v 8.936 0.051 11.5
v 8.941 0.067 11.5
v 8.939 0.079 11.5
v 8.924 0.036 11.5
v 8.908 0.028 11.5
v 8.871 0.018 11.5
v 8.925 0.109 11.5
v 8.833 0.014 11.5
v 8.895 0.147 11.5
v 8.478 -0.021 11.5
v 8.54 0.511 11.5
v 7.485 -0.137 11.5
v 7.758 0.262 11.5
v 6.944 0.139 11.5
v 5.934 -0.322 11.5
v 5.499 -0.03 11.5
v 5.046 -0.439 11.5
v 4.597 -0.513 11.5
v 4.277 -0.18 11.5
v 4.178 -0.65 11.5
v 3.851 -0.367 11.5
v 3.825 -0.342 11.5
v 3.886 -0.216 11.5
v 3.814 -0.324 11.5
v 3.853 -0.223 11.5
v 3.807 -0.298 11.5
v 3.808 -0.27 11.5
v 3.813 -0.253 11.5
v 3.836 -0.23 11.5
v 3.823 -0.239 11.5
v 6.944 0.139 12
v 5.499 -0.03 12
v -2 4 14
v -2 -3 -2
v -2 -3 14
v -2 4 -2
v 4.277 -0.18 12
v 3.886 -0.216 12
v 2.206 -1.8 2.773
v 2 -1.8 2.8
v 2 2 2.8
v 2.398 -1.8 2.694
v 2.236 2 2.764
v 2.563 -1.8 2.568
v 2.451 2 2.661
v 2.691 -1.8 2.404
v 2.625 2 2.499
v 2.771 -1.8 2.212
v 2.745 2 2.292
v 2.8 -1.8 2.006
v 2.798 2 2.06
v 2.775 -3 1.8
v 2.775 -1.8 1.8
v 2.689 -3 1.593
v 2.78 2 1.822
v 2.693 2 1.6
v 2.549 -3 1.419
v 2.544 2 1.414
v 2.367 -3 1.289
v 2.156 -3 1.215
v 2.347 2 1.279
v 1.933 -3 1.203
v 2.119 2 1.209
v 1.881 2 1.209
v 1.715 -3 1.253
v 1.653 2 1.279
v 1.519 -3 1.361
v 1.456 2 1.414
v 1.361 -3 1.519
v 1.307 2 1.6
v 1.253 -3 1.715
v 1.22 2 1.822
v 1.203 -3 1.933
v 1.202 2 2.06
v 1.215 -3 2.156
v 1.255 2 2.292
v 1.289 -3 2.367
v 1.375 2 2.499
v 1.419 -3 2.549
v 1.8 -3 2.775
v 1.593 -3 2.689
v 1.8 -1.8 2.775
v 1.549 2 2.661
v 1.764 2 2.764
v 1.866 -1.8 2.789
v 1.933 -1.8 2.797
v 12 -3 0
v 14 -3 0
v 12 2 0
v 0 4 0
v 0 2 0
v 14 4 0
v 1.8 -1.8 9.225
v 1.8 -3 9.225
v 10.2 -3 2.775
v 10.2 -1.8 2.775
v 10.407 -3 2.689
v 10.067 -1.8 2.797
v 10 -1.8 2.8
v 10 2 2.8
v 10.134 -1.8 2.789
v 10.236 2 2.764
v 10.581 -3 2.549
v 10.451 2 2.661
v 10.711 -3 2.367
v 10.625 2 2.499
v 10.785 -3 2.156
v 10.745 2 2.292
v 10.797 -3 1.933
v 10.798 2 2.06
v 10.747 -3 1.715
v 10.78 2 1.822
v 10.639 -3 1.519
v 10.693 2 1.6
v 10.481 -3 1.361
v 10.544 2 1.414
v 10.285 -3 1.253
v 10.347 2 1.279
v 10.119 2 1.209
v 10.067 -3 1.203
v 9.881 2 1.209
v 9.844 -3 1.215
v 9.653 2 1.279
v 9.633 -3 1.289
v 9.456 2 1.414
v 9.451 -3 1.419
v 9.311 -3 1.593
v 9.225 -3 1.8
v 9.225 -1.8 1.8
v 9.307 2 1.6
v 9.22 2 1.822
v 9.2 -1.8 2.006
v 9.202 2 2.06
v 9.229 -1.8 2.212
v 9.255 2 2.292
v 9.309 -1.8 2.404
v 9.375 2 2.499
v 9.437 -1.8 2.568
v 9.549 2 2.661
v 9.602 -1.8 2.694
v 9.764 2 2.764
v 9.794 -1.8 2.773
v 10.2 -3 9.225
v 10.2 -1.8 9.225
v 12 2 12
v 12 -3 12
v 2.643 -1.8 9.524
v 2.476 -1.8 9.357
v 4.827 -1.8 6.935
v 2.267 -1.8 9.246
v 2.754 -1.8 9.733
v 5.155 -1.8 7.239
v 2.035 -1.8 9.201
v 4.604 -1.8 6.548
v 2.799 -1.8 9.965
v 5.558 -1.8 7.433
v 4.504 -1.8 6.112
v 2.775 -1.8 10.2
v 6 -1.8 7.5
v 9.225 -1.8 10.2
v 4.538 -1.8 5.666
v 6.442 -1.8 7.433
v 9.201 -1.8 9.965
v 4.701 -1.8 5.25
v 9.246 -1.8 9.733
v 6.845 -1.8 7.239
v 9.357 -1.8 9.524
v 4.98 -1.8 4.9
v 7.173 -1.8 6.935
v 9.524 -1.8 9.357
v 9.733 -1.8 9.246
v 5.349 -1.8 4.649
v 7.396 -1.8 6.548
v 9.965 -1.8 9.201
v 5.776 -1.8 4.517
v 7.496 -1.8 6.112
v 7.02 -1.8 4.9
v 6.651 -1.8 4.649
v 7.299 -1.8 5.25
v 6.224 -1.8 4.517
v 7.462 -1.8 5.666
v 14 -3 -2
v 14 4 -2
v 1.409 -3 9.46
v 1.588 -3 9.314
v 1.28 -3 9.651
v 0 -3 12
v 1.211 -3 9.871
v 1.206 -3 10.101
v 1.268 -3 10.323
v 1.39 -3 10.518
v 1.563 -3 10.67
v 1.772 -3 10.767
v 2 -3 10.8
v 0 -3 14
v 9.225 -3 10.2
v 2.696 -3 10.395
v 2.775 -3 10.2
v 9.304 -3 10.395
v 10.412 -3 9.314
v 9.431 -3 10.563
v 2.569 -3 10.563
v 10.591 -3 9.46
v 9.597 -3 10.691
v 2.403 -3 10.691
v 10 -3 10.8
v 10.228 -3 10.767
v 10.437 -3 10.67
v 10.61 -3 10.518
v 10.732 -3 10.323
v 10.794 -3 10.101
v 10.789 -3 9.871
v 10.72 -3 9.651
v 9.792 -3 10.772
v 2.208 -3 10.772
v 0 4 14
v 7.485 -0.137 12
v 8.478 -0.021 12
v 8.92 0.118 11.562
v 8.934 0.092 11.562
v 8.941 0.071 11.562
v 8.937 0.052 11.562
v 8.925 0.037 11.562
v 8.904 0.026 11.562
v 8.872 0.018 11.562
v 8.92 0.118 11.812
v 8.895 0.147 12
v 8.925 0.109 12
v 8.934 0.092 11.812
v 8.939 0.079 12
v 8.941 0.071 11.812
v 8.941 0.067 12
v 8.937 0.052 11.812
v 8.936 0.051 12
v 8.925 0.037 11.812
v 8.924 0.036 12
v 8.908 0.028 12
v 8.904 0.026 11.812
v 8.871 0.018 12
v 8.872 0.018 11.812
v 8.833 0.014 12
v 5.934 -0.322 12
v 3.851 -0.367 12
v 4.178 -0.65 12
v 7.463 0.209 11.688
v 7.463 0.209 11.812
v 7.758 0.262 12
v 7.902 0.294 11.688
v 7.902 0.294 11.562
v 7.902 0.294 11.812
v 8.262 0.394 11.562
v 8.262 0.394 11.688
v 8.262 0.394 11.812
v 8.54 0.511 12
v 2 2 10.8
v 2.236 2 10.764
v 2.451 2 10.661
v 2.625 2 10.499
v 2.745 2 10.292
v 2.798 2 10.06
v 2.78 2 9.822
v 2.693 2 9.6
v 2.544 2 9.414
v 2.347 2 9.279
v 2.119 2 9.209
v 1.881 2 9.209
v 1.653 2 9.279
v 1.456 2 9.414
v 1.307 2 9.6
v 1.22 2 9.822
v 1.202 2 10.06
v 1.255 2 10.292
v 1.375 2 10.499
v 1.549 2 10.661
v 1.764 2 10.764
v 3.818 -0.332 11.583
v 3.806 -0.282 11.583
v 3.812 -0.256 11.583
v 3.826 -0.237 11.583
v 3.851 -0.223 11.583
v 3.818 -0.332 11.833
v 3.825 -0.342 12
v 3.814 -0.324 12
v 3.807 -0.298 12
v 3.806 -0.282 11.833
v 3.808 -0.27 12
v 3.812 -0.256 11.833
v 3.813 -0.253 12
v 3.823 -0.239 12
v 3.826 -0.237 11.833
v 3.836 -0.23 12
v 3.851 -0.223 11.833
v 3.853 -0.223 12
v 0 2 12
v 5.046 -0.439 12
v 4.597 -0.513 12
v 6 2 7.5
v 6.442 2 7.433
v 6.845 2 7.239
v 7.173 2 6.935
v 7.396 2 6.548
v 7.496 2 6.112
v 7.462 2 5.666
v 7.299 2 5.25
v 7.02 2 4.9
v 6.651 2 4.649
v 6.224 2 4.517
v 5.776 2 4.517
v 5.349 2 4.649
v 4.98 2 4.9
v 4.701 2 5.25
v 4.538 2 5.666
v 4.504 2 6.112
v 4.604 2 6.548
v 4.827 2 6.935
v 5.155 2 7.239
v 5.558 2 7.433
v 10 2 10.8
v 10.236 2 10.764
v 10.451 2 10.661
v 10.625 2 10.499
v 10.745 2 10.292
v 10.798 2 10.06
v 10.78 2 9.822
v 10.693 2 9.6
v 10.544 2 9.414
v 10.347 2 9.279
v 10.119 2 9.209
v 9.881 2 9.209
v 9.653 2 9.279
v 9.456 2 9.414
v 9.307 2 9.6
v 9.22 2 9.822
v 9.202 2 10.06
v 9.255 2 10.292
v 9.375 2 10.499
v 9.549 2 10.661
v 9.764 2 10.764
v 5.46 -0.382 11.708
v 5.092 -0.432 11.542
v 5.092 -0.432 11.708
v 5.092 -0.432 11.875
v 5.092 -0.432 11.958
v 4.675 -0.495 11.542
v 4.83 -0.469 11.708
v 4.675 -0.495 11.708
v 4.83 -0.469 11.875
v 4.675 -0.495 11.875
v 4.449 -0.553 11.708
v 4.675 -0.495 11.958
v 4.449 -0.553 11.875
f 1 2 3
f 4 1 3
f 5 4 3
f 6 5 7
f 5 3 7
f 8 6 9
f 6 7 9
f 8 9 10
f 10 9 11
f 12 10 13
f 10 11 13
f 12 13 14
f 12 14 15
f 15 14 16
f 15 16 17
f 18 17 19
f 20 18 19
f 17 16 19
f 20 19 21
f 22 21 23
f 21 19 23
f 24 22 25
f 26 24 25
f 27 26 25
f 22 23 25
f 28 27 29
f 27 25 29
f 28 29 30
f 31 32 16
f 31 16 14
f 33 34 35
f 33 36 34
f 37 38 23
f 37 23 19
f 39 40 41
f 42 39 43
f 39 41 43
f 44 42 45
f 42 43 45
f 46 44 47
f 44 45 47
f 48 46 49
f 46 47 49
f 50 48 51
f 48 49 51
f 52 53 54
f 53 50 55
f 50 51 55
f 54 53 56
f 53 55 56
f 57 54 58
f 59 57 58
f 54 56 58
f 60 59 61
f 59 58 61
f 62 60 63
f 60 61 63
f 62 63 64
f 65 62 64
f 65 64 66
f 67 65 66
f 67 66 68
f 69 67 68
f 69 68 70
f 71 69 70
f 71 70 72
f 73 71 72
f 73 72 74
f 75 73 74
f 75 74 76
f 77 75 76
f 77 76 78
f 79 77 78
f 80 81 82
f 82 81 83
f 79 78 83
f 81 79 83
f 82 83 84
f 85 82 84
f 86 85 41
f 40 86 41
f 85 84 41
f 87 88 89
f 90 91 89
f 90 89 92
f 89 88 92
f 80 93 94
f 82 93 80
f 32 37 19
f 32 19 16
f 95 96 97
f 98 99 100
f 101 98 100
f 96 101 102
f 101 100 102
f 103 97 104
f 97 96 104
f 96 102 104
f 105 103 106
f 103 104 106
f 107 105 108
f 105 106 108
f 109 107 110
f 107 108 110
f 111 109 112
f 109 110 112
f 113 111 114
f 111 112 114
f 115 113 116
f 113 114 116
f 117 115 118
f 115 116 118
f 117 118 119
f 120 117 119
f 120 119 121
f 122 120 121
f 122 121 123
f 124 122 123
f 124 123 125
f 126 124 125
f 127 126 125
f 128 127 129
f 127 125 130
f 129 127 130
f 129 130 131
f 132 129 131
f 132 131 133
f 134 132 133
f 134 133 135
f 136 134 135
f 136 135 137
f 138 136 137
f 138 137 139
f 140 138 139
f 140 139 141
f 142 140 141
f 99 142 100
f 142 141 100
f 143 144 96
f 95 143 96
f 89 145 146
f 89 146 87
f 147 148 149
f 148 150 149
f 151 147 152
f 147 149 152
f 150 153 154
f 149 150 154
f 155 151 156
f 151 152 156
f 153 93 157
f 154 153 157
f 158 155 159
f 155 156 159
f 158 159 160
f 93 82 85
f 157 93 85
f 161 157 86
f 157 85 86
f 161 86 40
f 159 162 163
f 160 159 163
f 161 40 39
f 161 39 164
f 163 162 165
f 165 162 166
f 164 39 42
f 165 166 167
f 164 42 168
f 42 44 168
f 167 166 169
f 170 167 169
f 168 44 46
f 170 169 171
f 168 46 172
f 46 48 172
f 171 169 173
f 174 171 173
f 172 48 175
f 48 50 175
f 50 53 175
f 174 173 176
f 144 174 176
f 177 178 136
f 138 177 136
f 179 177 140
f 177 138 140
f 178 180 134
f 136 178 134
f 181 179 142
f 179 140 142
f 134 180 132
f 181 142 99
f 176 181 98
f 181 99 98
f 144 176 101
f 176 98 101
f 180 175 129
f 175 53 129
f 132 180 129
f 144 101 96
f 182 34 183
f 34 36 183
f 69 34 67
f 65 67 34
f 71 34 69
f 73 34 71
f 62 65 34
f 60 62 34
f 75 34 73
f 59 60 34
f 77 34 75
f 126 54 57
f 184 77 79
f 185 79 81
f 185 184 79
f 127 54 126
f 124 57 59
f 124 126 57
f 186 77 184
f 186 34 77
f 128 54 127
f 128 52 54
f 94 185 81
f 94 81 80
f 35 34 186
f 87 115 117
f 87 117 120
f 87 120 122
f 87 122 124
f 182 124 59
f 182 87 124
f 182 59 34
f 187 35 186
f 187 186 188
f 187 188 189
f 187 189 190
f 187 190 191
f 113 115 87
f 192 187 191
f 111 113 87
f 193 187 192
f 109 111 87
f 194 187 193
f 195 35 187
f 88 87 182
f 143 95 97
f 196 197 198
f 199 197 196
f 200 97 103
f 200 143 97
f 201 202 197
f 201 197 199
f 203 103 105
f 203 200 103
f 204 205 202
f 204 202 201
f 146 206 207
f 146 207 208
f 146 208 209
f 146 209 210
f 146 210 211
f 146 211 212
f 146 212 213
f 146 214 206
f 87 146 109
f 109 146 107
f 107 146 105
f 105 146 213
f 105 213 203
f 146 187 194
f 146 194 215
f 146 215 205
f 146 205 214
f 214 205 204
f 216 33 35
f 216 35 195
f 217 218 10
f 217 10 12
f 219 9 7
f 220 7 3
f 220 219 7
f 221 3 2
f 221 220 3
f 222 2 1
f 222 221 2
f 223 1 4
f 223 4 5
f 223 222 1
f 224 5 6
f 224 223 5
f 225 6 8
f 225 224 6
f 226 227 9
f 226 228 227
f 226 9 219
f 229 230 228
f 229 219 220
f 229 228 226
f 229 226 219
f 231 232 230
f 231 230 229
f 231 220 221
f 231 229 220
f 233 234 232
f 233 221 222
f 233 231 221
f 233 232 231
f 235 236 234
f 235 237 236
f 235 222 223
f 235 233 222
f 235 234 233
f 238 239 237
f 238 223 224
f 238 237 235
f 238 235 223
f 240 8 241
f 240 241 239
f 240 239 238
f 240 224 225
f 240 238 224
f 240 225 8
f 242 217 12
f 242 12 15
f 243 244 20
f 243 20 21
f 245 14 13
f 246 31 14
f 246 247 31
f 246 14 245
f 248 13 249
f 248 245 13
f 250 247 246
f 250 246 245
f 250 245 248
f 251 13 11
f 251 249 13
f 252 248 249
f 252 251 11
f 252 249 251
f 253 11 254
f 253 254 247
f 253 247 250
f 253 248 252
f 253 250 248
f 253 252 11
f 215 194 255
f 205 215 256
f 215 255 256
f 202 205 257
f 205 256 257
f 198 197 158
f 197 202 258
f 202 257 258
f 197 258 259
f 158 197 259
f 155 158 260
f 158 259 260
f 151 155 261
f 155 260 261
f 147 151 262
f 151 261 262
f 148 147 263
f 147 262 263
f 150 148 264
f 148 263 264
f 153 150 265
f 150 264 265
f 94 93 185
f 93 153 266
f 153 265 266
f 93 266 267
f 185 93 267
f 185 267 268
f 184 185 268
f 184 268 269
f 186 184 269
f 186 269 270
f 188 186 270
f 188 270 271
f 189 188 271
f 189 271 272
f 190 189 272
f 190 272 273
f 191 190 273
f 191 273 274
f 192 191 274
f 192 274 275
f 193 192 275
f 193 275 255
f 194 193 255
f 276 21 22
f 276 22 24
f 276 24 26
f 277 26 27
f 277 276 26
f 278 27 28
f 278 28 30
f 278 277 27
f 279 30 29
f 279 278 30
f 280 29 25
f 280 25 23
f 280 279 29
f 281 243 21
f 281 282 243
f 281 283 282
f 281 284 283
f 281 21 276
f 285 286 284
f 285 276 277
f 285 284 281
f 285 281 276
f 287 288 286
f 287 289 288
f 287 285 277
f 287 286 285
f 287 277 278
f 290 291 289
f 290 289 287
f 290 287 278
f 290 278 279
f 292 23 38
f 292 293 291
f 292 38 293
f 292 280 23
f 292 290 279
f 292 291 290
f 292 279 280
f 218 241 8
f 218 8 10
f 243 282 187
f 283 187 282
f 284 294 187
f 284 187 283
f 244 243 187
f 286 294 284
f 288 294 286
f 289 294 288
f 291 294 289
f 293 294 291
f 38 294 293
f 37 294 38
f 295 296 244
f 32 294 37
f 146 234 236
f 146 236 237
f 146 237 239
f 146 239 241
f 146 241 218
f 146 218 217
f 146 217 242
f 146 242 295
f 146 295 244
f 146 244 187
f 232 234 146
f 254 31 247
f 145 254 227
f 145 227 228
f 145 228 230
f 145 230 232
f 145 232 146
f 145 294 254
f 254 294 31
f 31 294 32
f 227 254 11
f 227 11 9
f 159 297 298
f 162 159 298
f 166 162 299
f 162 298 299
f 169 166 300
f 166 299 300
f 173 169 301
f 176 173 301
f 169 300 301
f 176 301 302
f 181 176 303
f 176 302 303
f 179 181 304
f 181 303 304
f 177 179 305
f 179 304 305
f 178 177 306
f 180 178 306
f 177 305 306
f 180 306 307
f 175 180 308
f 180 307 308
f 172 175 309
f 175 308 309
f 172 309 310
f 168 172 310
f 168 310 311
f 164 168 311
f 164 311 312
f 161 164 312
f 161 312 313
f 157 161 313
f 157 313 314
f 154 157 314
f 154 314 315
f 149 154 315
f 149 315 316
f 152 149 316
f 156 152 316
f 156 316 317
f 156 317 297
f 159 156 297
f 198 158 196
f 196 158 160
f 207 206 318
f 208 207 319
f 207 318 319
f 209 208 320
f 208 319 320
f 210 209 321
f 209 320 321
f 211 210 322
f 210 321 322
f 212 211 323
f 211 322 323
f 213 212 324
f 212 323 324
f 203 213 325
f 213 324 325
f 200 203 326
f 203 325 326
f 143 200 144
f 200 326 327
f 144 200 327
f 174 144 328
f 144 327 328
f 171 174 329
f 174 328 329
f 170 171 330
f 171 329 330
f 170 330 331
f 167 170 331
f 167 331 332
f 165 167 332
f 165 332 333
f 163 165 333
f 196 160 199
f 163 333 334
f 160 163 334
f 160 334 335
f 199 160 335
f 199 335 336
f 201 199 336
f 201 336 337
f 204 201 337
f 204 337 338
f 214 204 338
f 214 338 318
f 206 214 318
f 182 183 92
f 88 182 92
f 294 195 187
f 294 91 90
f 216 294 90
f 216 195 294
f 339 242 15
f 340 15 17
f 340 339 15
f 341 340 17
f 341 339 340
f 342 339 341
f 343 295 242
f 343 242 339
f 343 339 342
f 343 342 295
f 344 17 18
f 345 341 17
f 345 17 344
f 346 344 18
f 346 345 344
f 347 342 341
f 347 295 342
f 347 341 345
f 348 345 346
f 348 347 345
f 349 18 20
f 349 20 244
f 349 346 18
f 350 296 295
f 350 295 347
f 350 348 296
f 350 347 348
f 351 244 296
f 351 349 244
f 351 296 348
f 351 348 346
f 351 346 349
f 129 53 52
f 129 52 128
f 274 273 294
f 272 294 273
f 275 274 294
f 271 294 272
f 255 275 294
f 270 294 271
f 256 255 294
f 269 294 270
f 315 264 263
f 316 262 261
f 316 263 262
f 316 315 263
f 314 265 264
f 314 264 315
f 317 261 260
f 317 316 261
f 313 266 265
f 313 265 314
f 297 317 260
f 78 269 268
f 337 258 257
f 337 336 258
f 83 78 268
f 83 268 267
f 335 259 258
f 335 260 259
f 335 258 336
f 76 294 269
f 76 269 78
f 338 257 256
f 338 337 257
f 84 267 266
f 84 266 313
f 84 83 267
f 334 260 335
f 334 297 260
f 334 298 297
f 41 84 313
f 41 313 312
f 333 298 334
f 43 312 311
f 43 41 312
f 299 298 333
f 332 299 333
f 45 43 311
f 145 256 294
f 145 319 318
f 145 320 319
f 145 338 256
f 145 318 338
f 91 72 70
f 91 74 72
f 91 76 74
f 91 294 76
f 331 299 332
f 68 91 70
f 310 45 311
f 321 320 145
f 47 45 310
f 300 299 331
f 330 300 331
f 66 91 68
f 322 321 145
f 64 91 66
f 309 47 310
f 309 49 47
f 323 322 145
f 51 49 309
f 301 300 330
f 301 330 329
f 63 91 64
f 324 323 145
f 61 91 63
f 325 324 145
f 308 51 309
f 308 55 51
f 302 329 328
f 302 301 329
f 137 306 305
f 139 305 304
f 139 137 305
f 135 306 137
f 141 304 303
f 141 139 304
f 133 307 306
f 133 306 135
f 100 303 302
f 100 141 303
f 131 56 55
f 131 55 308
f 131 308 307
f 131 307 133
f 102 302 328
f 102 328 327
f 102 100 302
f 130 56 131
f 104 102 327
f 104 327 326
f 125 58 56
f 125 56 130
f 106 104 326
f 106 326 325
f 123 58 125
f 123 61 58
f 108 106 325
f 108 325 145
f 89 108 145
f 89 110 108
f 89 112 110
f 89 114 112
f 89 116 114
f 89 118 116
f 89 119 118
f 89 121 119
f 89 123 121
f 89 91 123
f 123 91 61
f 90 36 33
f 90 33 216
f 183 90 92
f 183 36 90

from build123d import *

# Parameters (mm, degrees)
SKETCH1_W           = 12
SKETCH1_H           = 12
BOSS_EXTRUDE1_DEPTH = 3
SHELL2_T            = -1.8
SKETCH3_R           = 1.5
CUT_EXTRUDE3_DEPTH  = 1.8
BOSS_EXTRUDE2_START = 2
SKETCH3_3_W         = 16
SKETCH3_3_H         = 16
SKETCH3_3_W_2       = 12
SKETCH3_3_H_2       = 12
SKETCH3_3_R         = 1.5
BOSS_EXTRUDE2_DEPTH = 2
SKETCH4_W           = 14
SKETCH4_H           = 2
BOSS_EXTRUDE3_DEPTH = 2
SKETCH5_W           = 16
SKETCH5_H           = 16
SKETCH5_W_2         = 12
SKETCH5_H_2         = 12
BOSS_EXTRUDE4_DEPTH = 3
SKETCH6_W           = 14
SKETCH6_H           = 5
CUT_EXTRUDE4_DEPTH  = 2
SKETCH7_W           = 12
SKETCH7_H           = 5
CUT_EXTRUDE5_DEPTH  = 2
CUT_EXTRUDE6_DEPTH  = 0.5
SKETCH9_R           = 0.8
CUT_EXTRUDE7_DEPTH  = 21.420577881


with BuildPart() as part:
    # Sketch1 → Boss-Extrude1 (new body)
    with BuildSketch(Plane(origin=(0, 0, 0), x_dir=(1, 0, 0), z_dir=(0, 1, 0))):
        with Locations((6, -6)):
            Rectangle(SKETCH1_W, SKETCH1_H)
    extrude(amount=-BOSS_EXTRUDE1_DEPTH)

    # Shell2
    shell2_openings = [part.faces().sort_by_distance(p)[0] for p in [
        (6, -3, 6),
    ]]
    offset(amount=SHELL2_T, openings=shell2_openings, kind=Kind.INTERSECTION)

    # Sketch3 → Cut-Extrude3 (cut)
    with BuildSketch(Plane(origin=(0, 0, 0), x_dir=(1, 0, 0), z_dir=(0, 1, 0))):
        with Locations(Location((6, -6, 0), (0, 0, 270))):
            Circle(SKETCH3_R)
    extrude(amount=-CUT_EXTRUDE3_DEPTH, mode=Mode.SUBTRACT)

    # Sketch3<3> → Boss-Extrude2 (add)
    # profile 1 of 2: a face of its own
    with BuildSketch(Plane(origin=(0, 0, 0), x_dir=(1, 0, 0), z_dir=(0, 1, 0)).offset(BOSS_EXTRUDE2_START)):
        with Locations((6, -6)):
            Rectangle(SKETCH3_3_W, SKETCH3_3_H)
        with Locations((6, -6)):
            Rectangle(SKETCH3_3_W_2, SKETCH3_3_H_2, mode=Mode.SUBTRACT)
    # profile 2 of 2: a face of its own
    with BuildSketch(Plane(origin=(0, 0, 0), x_dir=(1, 0, 0), z_dir=(0, 1, 0)).offset(BOSS_EXTRUDE2_START)):
        with Locations((6, -6)):
            Rectangle(SKETCH3_3_W_2, SKETCH3_3_H_2)
        with Locations(Location((6, -6, 0), (0, 0, 270))):
            Circle(SKETCH3_3_R, mode=Mode.SUBTRACT)
    extrude(amount=-BOSS_EXTRUDE2_DEPTH)

    # Sketch4 → Boss-Extrude3 (add)
    with BuildSketch(Plane(origin=(0, 2, 0), x_dir=(1, 0, 0), z_dir=(0, 1, 0))):
        Polygon((0, 2), (-2, 2), (-2, -14), (0, -14), (0, 0), align=None)
        with Locations((7, 1)):
            Rectangle(SKETCH4_W, SKETCH4_H)
    extrude(amount=BOSS_EXTRUDE3_DEPTH)

    # Sketch5 → Boss-Extrude4 (add)
    with BuildSketch(Plane.XZ):
        with Locations((6, 6)):
            Rectangle(SKETCH5_W, SKETCH5_H)
        with Locations((6, 6)):
            Rectangle(SKETCH5_W_2, SKETCH5_H_2, mode=Mode.SUBTRACT)
    extrude(amount=BOSS_EXTRUDE4_DEPTH)

    # Sketch6 → Cut-Extrude4 (cut)
    with BuildSketch(Plane.XY.offset(14)):
        with Locations((7, -0.5)):
            Rectangle(SKETCH6_W, SKETCH6_H)
    extrude(amount=-CUT_EXTRUDE4_DEPTH, mode=Mode.SUBTRACT)

    # Sketch7 → Cut-Extrude5 (cut)
    with BuildSketch(Plane(origin=(14, 0, 0), x_dir=(0, 0, -1), z_dir=(1, 0, 0))):
        with Locations((-6, -0.5)):
            Rectangle(SKETCH7_W, SKETCH7_H)
    extrude(amount=-CUT_EXTRUDE5_DEPTH, mode=Mode.SUBTRACT)

    # Sketch8 → Cut-Extrude6 (cut)
    with BuildSketch(Plane.XY.offset(12)):
        with BuildLine():
            Line((5.499365182, -0.030316533), (6.944147055, 0.139116978))
            add(Edge.make_bspline(
                [(6.944147055, 0.139116978), (7.033959338, 0.149589911), (7.207292534, 0.169802147), (7.456935343, 0.206659273), (7.686554115, 0.246864239), (7.896440991, 0.291462829), (8.086108286, 0.339865769), (8.256388111, 0.390049541), (8.406137381, 0.446305372), (8.496905896, 0.49005931), (8.539974305, 0.51081995)],
                knots=[0, 0, 0, 0, 1.318163599, 2.543989528, 3.678365744, 4.716171039, 5.671329954, 6.531514493, 7.303223867, 8, 8, 8, 8], degree=3))
            Line((8.539974305, 0.51081995), (8.894602583, 0.146997606))
            add(Edge.make_bspline(
                [(8.894602583, 0.146997606), (8.903504519, 0.13774703), (8.91939642, 0.121232731), (8.933040884, 0.094560662), (8.942770969, 0.072093955), (8.937635666, 0.051580559), (8.925089845, 0.034251106), (8.900964781, 0.024529461), (8.870149866, 0.016869042), (8.846087974, 0.015236889), (8.832870994, 0.014340361)],
                knots=[0, 0, 0, 0, 1.361923056, 2.431330196, 3.216705747, 3.88751825, 4.590291911, 5.428398407, 6.587442422, 8, 8, 8, 8], degree=3))
            Line((8.832870994, 0.014340361), (8.478242716, -0.021122466))
            Line((8.478242716, -0.021122466), (7.485283538, -0.136705016))
            Line((7.485283538, -0.136705016), (5.934113182, -0.321899783))
            add(Edge.make_bspline(
                [(5.934113182, -0.321899783), (5.850481605, -0.332333939), (5.69237844, -0.352059419), (5.468673749, -0.381100719), (5.271621052, -0.407112207), (5.100999285, -0.431234493), (4.956401672, -0.450505772), (4.838594823, -0.467397889), (4.747497081, -0.481707682), (4.65962381, -0.49747077), (4.562769862, -0.520689248), (4.443406404, -0.552923227), (4.314473425, -0.598718655), (4.224826658, -0.63258625), (4.178046488, -0.6502593)],
                knots=[0, 0, 0, 0, 1.692798098, 3.200187617, 4.530910958, 5.684993954, 6.661249462, 7.46089318, 8.075318241, 8.513415889, 9.253600346, 10.074996663, 10.995479859, 12, 12, 12, 12], degree=3))
            Line((4.178046488, -0.6502593), (3.85100041, -0.366556678))
            add(Edge.make_bspline(
                [(3.85100041, -0.366556678), (3.838610297, -0.356171923), (3.812805776, -0.334543902), (3.803900048, -0.290524917), (3.80934915, -0.25628733), (3.825603847, -0.233888183), (3.853323458, -0.221153848), (3.874526491, -0.217543712), (3.886463237, -0.2155113)],
                knots=[0, 0, 0, 0, 1.325695646, 2.760987115, 3.510625552, 4.19429037, 4.983433253, 6, 6, 6, 6], degree=3))
            Line((3.886463237, -0.2155113), (4.276554343, -0.180048472))
            Line((4.276554343, -0.180048472), (5.499365182, -0.030316533))
        make_face()
    extrude(amount=-CUT_EXTRUDE6_DEPTH, mode=Mode.SUBTRACT)

    # Sketch9 → Cut-Extrude7 (cut, through all)
    with BuildSketch(Plane(origin=(0, 2, 0), x_dir=(1, 0, 0), z_dir=(0, 1, 0))):
        with Locations(Location((2, -10, 0), (0, 0, 270))):
            Circle(SKETCH9_R)
        with Locations(Location((10, -10, 0), (0, 0, 270))):
            Circle(SKETCH9_R)
        with Locations(Location((2, -2, 0), (0, 0, 270))):
            Circle(SKETCH9_R)
        with Locations(Location((10, -2, 0), (0, 0, 270))):
            Circle(SKETCH9_R)
    extrude(amount=-CUT_EXTRUDE7_DEPTH, mode=Mode.SUBTRACT)


solid = part.part
